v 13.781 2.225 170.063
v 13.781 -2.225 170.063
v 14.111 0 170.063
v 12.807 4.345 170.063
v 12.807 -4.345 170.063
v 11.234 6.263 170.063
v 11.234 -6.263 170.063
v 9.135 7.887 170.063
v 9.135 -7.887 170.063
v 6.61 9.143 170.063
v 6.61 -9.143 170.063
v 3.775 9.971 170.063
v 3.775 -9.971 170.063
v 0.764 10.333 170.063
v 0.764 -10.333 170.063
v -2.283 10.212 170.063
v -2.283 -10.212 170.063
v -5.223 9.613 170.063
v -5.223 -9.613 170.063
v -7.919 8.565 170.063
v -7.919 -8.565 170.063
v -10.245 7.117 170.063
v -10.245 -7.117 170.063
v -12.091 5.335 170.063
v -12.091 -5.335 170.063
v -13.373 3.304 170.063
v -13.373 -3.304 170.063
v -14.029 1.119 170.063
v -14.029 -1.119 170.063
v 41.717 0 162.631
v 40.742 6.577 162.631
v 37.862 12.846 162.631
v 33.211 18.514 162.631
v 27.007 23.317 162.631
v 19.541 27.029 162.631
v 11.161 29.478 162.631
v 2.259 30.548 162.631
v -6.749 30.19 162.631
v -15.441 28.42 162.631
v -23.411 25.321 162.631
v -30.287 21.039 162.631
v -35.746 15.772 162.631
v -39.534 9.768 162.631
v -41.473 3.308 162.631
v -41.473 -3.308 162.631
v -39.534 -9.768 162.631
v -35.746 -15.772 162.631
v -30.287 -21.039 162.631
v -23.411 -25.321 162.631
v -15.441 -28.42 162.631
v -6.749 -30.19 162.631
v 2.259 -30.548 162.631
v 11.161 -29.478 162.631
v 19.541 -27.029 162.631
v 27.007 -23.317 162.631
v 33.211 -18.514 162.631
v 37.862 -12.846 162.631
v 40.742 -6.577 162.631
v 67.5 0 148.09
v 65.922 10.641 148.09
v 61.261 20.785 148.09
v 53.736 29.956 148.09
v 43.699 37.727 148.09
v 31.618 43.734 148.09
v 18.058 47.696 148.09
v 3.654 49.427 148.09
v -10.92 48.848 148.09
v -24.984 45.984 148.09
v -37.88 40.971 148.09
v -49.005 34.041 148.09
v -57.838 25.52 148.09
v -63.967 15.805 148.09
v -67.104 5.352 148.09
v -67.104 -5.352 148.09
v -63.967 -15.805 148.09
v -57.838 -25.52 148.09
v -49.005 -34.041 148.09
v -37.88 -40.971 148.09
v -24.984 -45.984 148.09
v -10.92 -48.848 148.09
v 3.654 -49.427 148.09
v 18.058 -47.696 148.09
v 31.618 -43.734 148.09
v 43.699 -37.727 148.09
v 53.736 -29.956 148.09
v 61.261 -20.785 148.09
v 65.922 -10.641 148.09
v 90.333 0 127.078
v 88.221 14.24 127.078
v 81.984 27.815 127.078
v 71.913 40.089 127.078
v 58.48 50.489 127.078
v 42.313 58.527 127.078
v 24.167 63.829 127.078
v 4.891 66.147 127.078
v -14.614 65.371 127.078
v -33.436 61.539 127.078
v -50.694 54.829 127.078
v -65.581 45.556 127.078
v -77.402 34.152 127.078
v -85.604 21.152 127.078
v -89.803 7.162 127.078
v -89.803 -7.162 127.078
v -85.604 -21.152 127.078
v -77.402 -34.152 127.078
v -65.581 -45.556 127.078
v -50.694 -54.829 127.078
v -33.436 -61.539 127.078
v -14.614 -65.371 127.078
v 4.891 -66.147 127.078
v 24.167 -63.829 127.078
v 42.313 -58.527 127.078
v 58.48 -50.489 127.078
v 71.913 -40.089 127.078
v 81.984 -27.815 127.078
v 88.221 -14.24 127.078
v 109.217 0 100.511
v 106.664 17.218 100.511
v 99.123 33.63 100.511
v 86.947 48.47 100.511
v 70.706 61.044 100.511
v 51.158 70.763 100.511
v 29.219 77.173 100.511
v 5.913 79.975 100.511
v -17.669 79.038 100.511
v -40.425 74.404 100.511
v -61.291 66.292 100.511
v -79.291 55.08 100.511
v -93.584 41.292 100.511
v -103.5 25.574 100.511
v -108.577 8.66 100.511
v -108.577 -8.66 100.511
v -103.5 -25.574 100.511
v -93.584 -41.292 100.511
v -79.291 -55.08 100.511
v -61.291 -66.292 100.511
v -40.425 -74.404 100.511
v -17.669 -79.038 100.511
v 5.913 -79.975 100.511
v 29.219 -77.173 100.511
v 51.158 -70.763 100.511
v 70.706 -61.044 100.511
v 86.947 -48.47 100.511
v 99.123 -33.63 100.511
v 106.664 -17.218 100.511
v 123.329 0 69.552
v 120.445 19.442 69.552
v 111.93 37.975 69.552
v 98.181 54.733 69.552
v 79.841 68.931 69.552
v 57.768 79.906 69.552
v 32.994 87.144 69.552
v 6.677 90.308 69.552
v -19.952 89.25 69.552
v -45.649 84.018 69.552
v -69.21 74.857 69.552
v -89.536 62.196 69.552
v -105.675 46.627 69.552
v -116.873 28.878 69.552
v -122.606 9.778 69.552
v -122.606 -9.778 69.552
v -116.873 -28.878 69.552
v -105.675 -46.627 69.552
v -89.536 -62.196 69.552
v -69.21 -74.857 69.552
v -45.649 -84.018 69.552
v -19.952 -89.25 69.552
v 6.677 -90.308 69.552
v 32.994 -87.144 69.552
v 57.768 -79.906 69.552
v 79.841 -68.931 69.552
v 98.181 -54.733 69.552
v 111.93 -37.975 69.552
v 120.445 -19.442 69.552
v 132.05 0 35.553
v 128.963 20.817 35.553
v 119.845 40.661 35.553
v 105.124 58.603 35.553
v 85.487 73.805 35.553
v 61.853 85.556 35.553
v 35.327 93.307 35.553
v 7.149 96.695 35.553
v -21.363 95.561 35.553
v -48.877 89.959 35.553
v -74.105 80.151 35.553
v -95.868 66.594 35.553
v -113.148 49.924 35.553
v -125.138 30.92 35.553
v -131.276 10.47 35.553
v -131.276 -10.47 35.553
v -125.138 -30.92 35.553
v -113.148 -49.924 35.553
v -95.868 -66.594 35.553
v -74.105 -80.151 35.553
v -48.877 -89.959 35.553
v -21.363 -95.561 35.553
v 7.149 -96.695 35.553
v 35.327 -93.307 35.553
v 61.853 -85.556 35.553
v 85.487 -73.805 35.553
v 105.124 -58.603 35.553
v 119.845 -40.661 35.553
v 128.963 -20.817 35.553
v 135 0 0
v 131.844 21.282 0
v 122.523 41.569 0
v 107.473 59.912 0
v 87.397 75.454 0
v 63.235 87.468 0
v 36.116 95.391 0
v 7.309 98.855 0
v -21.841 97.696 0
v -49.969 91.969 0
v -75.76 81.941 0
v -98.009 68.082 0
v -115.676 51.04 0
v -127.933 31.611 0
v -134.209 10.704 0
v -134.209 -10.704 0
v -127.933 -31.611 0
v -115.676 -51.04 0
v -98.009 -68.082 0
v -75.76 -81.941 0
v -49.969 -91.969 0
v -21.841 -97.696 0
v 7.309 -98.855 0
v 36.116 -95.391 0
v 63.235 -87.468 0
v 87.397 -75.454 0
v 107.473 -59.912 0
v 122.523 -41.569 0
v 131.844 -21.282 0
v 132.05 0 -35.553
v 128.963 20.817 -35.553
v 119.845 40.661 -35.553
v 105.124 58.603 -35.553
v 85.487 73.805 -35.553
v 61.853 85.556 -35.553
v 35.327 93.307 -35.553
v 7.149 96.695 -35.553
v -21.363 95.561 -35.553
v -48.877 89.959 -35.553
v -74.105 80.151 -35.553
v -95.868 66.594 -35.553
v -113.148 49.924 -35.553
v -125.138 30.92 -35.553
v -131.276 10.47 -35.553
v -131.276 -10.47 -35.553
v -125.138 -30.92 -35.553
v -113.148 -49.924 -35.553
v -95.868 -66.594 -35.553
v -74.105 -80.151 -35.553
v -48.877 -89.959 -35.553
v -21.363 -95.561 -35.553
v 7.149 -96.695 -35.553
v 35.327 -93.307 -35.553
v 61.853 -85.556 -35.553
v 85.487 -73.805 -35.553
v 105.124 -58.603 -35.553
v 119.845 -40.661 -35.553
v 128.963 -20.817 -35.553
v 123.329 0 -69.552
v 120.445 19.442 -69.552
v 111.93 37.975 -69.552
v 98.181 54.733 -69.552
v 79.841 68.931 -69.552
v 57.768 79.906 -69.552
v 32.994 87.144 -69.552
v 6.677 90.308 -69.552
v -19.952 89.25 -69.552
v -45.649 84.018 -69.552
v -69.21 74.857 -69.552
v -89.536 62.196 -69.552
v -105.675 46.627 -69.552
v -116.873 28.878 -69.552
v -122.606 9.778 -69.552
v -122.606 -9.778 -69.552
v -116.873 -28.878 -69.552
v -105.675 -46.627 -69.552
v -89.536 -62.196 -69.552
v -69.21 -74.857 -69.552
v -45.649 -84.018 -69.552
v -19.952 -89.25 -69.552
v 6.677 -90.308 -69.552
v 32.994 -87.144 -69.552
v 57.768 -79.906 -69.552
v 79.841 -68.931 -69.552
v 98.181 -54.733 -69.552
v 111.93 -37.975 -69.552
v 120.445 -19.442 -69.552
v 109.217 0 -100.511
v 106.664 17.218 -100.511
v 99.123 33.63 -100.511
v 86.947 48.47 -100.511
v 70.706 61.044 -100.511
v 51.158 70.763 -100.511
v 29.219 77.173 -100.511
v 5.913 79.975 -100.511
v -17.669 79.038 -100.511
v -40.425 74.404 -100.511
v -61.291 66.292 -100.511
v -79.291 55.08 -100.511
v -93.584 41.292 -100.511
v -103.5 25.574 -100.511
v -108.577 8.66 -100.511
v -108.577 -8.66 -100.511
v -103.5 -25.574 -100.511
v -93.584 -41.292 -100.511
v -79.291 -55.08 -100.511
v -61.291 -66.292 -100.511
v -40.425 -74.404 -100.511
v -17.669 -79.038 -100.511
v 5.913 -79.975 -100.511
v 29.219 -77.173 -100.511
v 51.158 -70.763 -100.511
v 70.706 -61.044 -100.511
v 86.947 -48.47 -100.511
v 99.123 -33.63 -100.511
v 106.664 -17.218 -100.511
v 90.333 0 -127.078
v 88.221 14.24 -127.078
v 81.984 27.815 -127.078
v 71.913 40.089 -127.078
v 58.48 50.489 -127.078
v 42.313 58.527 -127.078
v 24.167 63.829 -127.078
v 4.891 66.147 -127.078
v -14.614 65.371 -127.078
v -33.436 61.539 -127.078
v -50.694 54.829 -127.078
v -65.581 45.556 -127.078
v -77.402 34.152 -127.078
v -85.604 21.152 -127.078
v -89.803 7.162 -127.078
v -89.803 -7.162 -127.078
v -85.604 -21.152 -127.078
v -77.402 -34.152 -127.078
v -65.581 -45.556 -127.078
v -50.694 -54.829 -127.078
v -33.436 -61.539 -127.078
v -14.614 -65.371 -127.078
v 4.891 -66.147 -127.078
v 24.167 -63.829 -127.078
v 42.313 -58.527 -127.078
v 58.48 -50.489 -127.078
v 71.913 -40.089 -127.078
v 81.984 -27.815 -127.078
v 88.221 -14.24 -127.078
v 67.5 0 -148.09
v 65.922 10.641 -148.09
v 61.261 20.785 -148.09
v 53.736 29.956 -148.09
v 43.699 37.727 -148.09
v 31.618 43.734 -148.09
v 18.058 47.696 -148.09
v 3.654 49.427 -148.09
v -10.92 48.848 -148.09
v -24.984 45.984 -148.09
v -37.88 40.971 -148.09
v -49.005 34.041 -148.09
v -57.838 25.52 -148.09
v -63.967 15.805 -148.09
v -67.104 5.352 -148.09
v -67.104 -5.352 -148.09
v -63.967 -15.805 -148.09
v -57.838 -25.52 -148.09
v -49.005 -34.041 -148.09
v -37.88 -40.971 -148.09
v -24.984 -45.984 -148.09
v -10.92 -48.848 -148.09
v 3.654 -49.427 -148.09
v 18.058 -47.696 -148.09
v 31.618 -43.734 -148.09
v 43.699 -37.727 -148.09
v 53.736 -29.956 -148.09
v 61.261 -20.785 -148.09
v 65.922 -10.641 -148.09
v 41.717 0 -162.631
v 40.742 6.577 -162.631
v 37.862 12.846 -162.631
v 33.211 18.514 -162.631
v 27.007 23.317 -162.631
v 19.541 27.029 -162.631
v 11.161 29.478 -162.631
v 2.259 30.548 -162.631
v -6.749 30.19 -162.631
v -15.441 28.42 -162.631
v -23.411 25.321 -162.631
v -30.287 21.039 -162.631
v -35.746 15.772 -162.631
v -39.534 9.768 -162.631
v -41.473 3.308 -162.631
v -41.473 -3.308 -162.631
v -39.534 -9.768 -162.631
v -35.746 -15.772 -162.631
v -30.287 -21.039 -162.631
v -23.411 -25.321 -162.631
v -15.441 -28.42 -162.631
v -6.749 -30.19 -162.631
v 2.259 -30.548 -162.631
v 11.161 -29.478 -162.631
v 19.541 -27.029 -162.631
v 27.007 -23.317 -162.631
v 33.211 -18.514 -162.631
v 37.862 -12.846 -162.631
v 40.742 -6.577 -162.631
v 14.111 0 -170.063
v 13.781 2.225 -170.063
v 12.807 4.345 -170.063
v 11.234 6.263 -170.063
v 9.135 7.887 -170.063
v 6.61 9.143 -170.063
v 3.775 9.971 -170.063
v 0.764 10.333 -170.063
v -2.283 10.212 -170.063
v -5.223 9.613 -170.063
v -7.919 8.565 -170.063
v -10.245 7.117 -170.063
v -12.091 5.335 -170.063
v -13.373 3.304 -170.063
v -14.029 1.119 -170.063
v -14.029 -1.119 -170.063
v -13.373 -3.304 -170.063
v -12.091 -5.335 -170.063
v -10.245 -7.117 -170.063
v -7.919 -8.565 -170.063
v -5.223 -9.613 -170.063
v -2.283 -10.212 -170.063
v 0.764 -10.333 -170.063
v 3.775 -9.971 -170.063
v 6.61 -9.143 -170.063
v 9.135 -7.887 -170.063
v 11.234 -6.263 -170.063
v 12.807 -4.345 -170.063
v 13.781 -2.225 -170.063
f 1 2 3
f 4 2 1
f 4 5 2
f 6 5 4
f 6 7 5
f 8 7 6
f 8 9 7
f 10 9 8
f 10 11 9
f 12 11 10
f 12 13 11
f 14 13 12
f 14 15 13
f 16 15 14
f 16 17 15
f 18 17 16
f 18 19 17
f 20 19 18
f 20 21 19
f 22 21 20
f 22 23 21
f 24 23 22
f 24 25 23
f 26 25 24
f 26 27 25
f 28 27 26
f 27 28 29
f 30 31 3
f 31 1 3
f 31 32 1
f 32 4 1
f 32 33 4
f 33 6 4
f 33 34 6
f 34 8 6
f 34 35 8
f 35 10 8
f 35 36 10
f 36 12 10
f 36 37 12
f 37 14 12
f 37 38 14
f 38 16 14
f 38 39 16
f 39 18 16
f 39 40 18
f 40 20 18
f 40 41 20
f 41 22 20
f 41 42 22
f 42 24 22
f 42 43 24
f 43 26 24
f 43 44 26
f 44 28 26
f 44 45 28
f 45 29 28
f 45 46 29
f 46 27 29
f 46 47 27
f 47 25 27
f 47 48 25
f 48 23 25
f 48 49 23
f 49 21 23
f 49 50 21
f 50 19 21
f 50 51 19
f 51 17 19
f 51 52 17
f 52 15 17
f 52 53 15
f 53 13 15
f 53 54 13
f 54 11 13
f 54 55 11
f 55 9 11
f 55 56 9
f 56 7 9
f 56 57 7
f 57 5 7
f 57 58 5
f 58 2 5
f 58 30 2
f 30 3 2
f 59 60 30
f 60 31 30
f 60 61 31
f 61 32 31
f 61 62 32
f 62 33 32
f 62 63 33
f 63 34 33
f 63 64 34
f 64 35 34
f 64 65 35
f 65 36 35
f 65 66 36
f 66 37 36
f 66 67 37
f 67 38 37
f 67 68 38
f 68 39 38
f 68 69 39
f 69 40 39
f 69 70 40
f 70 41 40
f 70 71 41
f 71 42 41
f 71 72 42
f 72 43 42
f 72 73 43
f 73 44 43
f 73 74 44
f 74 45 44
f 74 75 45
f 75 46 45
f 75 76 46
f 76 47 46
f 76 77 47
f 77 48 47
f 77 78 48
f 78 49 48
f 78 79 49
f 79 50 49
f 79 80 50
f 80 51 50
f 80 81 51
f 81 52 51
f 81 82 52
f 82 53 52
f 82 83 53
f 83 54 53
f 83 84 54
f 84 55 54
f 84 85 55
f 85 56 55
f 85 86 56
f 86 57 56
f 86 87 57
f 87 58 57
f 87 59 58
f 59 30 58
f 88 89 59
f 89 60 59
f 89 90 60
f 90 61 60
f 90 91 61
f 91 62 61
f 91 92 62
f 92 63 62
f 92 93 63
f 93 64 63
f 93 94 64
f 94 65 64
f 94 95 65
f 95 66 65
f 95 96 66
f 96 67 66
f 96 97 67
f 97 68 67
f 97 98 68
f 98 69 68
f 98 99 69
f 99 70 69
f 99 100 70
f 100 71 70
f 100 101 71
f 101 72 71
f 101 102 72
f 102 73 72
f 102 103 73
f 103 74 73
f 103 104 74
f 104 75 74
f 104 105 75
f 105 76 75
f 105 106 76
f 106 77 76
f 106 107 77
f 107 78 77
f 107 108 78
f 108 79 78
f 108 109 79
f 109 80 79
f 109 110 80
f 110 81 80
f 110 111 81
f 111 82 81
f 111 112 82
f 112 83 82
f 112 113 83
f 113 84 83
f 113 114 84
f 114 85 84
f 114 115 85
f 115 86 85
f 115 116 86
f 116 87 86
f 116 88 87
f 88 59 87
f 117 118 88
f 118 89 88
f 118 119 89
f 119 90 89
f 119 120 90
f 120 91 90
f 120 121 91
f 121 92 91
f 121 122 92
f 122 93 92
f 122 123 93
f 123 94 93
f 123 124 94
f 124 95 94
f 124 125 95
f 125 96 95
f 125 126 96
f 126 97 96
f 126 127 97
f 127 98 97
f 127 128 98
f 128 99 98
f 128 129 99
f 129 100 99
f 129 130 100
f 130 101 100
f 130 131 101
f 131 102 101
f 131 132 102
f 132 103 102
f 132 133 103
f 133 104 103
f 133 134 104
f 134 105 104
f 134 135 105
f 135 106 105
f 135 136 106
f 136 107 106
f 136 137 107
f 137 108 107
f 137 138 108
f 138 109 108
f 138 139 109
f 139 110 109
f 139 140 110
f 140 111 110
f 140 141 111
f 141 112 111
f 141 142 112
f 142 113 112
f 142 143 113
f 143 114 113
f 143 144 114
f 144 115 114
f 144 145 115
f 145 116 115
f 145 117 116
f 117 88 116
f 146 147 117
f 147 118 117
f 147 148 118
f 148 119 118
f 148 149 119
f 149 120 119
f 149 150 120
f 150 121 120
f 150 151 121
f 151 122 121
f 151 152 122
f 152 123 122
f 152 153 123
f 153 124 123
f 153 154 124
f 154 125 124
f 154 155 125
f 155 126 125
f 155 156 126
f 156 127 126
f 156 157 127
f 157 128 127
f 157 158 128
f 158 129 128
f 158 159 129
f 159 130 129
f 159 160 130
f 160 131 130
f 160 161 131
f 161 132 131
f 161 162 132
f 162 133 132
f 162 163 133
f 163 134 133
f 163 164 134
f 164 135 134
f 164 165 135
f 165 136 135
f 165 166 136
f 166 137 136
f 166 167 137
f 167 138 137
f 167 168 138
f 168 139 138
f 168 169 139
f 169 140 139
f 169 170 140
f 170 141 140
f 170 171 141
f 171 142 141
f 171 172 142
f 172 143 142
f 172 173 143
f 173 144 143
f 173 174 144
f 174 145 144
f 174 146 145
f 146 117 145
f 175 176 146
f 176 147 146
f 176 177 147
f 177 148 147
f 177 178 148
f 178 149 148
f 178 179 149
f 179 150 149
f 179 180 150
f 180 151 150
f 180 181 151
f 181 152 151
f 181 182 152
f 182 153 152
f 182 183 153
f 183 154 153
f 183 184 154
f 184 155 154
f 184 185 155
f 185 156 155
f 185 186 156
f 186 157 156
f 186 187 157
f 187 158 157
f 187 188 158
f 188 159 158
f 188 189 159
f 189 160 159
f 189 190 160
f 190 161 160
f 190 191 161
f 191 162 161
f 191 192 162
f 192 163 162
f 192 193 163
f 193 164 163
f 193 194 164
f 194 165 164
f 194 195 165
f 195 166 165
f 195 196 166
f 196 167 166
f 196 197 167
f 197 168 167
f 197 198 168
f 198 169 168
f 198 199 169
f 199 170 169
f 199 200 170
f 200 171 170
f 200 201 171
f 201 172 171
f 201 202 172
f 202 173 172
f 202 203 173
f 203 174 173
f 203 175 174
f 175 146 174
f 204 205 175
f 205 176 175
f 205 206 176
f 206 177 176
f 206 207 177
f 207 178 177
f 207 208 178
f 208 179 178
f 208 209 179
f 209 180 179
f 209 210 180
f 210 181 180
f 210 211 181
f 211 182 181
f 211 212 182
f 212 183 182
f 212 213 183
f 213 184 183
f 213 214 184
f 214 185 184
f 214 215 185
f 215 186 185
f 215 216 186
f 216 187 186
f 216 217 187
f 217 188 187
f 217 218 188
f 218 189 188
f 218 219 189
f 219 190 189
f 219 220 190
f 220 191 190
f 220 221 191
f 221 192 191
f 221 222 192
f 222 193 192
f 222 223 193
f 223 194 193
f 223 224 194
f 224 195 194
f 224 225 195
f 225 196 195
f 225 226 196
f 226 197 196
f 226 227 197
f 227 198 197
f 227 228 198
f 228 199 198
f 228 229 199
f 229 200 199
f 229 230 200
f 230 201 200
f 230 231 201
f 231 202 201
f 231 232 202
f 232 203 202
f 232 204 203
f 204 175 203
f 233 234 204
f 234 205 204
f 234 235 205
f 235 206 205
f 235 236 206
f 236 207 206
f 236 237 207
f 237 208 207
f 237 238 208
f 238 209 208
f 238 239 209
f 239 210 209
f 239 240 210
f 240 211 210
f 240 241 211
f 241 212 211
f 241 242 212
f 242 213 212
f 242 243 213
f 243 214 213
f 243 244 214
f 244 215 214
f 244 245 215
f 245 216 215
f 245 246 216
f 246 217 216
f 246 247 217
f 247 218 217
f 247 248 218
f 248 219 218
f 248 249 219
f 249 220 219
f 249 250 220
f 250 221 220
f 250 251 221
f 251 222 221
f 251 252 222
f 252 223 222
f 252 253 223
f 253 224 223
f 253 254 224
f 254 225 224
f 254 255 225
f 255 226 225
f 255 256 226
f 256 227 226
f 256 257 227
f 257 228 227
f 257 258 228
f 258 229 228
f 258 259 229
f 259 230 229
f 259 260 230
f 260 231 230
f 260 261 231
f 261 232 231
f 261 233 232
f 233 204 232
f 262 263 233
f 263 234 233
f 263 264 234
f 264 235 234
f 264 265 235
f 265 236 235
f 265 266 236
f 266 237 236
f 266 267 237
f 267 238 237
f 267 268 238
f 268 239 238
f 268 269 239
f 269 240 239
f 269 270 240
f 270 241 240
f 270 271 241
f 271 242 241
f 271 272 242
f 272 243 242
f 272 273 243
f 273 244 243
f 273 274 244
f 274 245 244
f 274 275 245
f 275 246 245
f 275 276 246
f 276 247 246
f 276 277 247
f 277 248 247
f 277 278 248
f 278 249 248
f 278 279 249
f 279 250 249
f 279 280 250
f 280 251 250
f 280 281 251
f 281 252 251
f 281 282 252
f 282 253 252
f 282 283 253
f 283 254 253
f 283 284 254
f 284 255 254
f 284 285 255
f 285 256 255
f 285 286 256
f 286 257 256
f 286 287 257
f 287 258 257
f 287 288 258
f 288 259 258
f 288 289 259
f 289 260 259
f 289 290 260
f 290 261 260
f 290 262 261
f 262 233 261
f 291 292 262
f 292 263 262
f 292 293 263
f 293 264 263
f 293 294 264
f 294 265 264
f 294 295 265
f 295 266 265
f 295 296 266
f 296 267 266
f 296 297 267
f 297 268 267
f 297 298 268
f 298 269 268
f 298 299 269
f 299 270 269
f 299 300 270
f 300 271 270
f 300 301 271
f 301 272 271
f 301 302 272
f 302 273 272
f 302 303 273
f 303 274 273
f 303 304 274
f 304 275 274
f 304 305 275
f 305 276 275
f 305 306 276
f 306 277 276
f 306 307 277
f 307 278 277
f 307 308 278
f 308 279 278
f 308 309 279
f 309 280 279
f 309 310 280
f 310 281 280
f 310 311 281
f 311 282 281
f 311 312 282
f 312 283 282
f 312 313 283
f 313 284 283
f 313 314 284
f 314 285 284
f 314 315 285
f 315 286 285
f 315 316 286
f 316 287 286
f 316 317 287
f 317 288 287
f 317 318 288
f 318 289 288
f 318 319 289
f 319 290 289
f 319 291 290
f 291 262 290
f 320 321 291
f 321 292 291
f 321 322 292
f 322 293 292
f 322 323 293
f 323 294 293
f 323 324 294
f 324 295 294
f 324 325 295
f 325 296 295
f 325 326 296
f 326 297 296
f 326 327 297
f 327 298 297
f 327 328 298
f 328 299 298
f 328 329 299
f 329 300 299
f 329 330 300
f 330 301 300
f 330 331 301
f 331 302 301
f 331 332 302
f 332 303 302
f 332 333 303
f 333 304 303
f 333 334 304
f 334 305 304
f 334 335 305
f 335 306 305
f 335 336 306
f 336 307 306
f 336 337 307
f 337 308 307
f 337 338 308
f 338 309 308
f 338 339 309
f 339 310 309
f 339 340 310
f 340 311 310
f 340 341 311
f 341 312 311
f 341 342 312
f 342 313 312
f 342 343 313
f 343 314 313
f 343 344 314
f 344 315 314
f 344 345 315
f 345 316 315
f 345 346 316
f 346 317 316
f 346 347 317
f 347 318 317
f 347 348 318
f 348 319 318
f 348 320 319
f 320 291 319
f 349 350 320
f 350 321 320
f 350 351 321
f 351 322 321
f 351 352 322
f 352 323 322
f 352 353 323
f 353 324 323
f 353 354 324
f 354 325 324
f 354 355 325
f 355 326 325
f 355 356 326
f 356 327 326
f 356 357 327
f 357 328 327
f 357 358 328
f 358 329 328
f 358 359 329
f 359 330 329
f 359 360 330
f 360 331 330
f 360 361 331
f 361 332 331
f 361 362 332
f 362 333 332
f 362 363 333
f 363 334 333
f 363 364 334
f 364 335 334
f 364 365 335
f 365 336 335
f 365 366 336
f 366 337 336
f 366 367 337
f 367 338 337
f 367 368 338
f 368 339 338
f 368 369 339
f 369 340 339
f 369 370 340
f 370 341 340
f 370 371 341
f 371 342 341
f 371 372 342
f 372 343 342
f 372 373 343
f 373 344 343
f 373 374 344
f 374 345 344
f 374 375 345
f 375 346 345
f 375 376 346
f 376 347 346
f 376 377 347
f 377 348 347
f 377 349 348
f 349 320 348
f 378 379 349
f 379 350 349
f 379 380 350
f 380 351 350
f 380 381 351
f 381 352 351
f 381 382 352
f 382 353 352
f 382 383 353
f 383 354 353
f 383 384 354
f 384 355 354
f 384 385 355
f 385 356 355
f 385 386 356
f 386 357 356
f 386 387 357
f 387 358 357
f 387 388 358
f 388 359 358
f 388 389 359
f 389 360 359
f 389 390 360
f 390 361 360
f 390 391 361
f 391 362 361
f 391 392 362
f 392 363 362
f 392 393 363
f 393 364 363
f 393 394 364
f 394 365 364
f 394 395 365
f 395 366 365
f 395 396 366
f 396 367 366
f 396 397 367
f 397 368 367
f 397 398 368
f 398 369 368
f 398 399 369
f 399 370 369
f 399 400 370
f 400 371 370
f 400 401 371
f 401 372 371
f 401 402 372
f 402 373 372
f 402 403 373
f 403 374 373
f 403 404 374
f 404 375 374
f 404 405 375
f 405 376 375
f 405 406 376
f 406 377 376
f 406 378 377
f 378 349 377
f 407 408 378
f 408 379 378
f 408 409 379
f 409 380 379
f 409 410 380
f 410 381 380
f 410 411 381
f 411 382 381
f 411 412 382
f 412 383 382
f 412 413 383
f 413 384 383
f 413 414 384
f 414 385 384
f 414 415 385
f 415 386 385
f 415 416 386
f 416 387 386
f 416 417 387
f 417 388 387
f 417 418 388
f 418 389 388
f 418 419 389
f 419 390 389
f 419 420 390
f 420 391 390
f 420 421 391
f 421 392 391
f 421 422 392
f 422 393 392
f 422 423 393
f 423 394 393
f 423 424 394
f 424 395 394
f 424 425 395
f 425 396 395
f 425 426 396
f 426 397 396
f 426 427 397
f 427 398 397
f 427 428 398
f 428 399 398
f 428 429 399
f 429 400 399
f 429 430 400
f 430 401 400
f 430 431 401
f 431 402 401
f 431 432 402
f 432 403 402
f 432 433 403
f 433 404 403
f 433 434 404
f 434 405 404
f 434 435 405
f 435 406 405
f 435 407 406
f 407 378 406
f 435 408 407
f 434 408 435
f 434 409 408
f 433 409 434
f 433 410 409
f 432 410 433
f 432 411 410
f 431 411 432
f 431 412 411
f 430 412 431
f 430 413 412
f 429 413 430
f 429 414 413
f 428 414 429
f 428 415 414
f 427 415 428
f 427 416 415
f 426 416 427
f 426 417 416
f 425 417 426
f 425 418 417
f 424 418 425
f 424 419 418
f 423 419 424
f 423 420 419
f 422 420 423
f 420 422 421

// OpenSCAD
// Generated by SolidPython 1.0.1 on 2020-07-29 00:46:52


scale(v = [15, 11, 19]) {
	sphere(r = 9);
}
/***********************************************
*********      SolidPython code:      **********
************************************************
 
# import packages: SolidPython
from solid import *
from solid.utils import *
from itertools import chain, combinations, permutations


class Resize:

    def __init__(self, scad_file):
        self.scad_file = scad_file
        #self.scad_file = import_scad(scad_file)
        # cone/cylinder param:
        self.r1 = 0
        self.r2 = 0
        self.h = 0
        # rectangular prism param:
        self.w = 0
        self.l = 0
        # ellipse param:
        self.r = 0

    # import OpenScad code (file name corresponds to shape)


    # classify shape + parameters
    def assign(self, param1, param2, param3):
        if self.scad_file == 'cone.scad':
            self.r1 = param1
            self.r2 = param2
            self.h = param3
        elif self.scad_file == 'cylinder.scad':
            self.r1 = param1
            self.r2 = param2
            self.h = param3
        elif self.scad_file == 'rectangularPrism.scad':
            self.h = param1
            self.l = param2
            self.w = param3
        else:
            self.r = param1
            self.h = param2

    # resize parameters
    def iterate(self):
        x = range(3, 20, 2)
        i = 1
        if self.scad_file == 'cone.scad':
            tempList = list(permutations(x, 2))
            for temp in tempList:
                param1 = temp[0]
                param2 = temp[1]
                filepath = 'produced_scad_files/' + 'cone' + str(param1) + '_' + str(param2) + '_' + '.scad'
                scad_render_to_file(cylinder(h=param1, r1=param2, r2=0), filepath)

        elif self.scad_file == 'cylinder.scad':
            tempList = list(permutations(x, 3))
            for temp in tempList:
                param1 = temp[0]
                param2 = temp[1]
                filepath = 'produced_scad_files/' + 'cylinder' + str(param1) + '_' + str(param2) + '_' + '.scad'
                scad_render_to_file(cylinder(h=param1, r1=param2, r2=param2), filepath)

        elif self.scad_file == 'rectangularPrism.scad':
            tempList = list(permutations(x, 3))
            for temp in tempList:
                param1 = temp[0]
                param2 = temp[1]
                param3 = temp[2]
                filepath = 'produced_scad_files/' + 'rectangularPrism' + str(param1) + '_' + str(param2) + '_' + str(
                    param3) + '.scad'
                scad_render_to_file(cube(size=(param1, param2, param3)), filepath)

        elif self.scad_file == 'ellipse.scad':
            tempList = list(permutations(x, 4))
            for temp in tempList:
                param1 = temp[0]
                param2 = temp[1]
                param3 = temp[2]
                param4 = temp[3]
                filepath = 'produced_scad_files/' + 'ellipse' + str(param1) + '_' + str(param2) + '_' + str(param3) + '_' + str(param4) + '.scad'
                scad_render_to_file(scale([param1, param2, param3])(sphere(r=param4)), filepath)

    def render_to_scadfile(self):
        scad_render_to_file(scad, 'example.scad') 
 
************************************************/
